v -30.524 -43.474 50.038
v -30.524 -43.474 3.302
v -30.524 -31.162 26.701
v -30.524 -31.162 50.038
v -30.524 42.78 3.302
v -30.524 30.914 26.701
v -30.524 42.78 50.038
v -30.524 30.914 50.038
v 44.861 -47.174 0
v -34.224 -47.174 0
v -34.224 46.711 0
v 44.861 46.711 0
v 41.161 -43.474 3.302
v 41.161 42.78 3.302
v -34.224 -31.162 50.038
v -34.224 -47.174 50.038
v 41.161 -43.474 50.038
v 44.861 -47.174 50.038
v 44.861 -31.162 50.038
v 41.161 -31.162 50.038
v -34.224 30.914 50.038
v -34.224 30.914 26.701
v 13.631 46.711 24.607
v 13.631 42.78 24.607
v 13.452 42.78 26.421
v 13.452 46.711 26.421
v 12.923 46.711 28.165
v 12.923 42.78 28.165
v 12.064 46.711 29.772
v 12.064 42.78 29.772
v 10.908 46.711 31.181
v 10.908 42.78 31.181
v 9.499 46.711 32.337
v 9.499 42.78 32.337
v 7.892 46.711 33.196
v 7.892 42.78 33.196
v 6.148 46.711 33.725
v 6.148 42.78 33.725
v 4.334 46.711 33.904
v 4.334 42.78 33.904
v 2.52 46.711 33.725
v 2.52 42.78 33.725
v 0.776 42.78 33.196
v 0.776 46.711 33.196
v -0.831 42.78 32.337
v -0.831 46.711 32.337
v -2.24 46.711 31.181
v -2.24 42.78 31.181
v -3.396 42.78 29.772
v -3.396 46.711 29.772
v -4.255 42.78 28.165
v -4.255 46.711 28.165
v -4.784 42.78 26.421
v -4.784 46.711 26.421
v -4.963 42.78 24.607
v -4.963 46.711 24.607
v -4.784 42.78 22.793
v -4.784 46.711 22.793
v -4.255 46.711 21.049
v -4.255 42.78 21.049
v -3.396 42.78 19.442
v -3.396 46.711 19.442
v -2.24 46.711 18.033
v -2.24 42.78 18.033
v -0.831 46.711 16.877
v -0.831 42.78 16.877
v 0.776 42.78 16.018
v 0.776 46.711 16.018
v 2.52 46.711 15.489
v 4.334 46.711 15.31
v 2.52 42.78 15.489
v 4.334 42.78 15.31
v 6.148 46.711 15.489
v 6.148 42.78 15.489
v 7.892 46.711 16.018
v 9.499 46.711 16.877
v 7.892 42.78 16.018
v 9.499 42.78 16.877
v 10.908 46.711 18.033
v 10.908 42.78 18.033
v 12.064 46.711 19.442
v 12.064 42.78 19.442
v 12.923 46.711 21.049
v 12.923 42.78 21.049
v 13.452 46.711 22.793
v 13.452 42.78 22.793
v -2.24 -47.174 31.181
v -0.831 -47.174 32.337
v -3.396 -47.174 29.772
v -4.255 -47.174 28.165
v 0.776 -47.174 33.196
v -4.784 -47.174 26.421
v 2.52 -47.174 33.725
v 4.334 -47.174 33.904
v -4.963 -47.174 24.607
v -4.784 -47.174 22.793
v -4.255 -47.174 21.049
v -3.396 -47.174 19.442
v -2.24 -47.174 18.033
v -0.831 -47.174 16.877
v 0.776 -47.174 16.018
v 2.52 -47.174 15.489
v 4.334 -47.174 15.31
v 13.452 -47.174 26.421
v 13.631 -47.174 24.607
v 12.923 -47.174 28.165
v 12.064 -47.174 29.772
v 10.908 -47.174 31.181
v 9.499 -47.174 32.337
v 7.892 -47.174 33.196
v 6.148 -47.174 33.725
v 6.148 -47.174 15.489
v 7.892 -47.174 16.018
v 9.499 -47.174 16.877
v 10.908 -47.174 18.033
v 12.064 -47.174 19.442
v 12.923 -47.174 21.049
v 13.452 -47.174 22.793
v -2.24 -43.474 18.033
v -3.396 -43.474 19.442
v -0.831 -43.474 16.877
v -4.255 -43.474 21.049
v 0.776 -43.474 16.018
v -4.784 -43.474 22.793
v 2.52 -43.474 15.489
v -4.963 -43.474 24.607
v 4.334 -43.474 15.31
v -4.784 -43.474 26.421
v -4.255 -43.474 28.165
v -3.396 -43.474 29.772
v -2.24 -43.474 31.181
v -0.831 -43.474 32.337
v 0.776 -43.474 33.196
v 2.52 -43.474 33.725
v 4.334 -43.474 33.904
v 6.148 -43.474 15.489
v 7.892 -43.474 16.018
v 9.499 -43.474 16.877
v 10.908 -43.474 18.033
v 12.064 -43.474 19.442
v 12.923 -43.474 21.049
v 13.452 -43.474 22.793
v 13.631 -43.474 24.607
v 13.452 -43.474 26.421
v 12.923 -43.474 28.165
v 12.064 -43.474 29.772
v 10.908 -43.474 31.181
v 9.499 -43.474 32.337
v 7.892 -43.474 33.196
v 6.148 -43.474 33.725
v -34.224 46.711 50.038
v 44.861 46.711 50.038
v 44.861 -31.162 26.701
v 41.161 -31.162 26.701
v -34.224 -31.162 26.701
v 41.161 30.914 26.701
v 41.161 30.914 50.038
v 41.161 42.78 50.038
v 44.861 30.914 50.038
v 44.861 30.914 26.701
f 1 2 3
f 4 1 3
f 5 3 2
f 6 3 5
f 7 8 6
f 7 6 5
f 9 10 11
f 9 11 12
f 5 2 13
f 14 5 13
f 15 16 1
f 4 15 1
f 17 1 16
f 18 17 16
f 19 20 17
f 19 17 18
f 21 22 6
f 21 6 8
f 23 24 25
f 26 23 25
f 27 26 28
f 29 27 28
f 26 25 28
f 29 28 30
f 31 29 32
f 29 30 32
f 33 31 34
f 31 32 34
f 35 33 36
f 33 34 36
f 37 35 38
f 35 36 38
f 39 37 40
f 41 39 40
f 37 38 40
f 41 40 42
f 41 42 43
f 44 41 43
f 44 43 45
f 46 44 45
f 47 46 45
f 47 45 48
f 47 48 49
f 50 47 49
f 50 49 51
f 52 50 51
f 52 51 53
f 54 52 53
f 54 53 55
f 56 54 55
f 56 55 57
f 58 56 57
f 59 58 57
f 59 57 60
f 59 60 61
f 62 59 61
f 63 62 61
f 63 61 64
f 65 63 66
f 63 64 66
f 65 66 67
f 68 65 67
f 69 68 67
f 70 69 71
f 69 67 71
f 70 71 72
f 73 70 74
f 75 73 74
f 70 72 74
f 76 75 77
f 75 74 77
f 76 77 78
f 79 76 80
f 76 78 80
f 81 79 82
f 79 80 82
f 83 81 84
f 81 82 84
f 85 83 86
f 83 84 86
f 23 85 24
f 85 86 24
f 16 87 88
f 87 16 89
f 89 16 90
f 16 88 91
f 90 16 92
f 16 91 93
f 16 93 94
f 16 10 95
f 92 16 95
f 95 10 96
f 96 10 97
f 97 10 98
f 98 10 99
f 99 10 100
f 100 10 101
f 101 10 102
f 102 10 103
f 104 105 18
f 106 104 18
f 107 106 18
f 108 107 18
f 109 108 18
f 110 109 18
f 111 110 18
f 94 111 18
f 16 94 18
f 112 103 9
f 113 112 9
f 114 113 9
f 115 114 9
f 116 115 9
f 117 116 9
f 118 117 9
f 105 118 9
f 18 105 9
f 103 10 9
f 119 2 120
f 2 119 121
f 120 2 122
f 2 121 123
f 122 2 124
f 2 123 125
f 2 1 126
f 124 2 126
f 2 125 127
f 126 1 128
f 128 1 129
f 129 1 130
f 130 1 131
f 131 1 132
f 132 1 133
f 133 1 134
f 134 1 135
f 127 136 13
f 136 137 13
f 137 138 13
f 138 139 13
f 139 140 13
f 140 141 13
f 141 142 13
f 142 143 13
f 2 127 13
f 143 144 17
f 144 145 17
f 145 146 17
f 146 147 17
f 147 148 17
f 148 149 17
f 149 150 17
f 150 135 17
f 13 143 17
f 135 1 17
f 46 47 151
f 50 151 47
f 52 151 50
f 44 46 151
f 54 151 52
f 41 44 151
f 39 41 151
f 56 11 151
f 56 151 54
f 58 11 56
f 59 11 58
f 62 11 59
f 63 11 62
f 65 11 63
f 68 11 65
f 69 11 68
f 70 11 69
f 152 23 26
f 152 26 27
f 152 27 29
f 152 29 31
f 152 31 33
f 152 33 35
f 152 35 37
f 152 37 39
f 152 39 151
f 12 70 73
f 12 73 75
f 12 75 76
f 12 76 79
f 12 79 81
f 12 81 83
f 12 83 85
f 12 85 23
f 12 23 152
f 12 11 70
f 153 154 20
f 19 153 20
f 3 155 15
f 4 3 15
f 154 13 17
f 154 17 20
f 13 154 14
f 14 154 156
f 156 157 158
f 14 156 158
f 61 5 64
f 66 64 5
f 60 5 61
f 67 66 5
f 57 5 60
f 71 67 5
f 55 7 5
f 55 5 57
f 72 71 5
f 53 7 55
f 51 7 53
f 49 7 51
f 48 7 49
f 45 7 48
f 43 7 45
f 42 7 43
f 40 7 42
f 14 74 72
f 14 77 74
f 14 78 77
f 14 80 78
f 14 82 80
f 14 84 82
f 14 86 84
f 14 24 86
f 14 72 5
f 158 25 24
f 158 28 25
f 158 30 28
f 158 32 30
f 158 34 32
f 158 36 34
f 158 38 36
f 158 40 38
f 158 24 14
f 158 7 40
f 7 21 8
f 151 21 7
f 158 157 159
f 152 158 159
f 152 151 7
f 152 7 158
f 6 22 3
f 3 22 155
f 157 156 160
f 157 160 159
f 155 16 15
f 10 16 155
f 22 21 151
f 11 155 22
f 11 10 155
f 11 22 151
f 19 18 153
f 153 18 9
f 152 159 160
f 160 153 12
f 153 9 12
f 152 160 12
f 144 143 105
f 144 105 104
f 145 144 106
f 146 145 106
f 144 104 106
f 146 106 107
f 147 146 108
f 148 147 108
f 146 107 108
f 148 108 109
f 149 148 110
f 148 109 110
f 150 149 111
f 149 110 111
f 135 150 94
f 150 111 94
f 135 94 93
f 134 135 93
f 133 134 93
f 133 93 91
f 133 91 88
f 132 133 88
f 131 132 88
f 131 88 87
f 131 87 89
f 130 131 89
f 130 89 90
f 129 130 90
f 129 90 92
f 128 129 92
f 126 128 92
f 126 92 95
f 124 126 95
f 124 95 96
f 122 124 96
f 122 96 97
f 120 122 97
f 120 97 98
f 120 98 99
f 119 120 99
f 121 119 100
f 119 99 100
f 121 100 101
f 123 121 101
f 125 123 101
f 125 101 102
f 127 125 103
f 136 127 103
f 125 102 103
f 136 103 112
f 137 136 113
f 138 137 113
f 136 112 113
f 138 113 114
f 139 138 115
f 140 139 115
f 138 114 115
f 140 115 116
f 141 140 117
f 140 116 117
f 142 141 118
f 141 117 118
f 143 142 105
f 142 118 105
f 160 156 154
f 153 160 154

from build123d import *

# Parameters (mm, degrees)
F0_W     = 79.085034
F0_H     = 93.884569
F1_DEPTH = 50.038
F2_W     = 62.076326
F2_H     = 23.337272
F3_DEPTH = 124.46
F4_W     = 71.68526
F4_H     = 86.253557
F5_DEPTH = 46.736
F6_R     = 9.296837
F7_DEPTH = 141.986


with BuildPart() as f1:
    # F0 (on Top) → F1 (new body)
    with BuildSketch(Plane.XY):
        with Locations((5.318584, -0.231241)):
            Rectangle(F0_W, F0_H)
    extrude(amount=F1_DEPTH)

    # F2 (on face) → F3 (cut)
    with BuildSketch(Plane(origin=(-34.223933, 0, 0), x_dir=(0, -1, 0), z_dir=(-1, 0, 0))):
        with Locations((0.123933, 38.369364)):
            Rectangle(F2_W, F2_H)
    extrude(amount=-F3_DEPTH, mode=Mode.SUBTRACT)

    # F4 (on face) → F5 (cut)
    with BuildSketch(Plane.XY.offset(50.038)):
        with Locations((5.318583, -0.346864)):
            Rectangle(F4_W, F4_H)
    extrude(amount=-F5_DEPTH, mode=Mode.SUBTRACT)

    # F6 (on face) → F7 (cut)
    with BuildSketch(Plane.XZ.offset(47.173526)):
        with Locations((4.334087, 24.607167)):
            Circle(F6_R)
    extrude(amount=-F7_DEPTH, mode=Mode.SUBTRACT)


solid = f1.part
